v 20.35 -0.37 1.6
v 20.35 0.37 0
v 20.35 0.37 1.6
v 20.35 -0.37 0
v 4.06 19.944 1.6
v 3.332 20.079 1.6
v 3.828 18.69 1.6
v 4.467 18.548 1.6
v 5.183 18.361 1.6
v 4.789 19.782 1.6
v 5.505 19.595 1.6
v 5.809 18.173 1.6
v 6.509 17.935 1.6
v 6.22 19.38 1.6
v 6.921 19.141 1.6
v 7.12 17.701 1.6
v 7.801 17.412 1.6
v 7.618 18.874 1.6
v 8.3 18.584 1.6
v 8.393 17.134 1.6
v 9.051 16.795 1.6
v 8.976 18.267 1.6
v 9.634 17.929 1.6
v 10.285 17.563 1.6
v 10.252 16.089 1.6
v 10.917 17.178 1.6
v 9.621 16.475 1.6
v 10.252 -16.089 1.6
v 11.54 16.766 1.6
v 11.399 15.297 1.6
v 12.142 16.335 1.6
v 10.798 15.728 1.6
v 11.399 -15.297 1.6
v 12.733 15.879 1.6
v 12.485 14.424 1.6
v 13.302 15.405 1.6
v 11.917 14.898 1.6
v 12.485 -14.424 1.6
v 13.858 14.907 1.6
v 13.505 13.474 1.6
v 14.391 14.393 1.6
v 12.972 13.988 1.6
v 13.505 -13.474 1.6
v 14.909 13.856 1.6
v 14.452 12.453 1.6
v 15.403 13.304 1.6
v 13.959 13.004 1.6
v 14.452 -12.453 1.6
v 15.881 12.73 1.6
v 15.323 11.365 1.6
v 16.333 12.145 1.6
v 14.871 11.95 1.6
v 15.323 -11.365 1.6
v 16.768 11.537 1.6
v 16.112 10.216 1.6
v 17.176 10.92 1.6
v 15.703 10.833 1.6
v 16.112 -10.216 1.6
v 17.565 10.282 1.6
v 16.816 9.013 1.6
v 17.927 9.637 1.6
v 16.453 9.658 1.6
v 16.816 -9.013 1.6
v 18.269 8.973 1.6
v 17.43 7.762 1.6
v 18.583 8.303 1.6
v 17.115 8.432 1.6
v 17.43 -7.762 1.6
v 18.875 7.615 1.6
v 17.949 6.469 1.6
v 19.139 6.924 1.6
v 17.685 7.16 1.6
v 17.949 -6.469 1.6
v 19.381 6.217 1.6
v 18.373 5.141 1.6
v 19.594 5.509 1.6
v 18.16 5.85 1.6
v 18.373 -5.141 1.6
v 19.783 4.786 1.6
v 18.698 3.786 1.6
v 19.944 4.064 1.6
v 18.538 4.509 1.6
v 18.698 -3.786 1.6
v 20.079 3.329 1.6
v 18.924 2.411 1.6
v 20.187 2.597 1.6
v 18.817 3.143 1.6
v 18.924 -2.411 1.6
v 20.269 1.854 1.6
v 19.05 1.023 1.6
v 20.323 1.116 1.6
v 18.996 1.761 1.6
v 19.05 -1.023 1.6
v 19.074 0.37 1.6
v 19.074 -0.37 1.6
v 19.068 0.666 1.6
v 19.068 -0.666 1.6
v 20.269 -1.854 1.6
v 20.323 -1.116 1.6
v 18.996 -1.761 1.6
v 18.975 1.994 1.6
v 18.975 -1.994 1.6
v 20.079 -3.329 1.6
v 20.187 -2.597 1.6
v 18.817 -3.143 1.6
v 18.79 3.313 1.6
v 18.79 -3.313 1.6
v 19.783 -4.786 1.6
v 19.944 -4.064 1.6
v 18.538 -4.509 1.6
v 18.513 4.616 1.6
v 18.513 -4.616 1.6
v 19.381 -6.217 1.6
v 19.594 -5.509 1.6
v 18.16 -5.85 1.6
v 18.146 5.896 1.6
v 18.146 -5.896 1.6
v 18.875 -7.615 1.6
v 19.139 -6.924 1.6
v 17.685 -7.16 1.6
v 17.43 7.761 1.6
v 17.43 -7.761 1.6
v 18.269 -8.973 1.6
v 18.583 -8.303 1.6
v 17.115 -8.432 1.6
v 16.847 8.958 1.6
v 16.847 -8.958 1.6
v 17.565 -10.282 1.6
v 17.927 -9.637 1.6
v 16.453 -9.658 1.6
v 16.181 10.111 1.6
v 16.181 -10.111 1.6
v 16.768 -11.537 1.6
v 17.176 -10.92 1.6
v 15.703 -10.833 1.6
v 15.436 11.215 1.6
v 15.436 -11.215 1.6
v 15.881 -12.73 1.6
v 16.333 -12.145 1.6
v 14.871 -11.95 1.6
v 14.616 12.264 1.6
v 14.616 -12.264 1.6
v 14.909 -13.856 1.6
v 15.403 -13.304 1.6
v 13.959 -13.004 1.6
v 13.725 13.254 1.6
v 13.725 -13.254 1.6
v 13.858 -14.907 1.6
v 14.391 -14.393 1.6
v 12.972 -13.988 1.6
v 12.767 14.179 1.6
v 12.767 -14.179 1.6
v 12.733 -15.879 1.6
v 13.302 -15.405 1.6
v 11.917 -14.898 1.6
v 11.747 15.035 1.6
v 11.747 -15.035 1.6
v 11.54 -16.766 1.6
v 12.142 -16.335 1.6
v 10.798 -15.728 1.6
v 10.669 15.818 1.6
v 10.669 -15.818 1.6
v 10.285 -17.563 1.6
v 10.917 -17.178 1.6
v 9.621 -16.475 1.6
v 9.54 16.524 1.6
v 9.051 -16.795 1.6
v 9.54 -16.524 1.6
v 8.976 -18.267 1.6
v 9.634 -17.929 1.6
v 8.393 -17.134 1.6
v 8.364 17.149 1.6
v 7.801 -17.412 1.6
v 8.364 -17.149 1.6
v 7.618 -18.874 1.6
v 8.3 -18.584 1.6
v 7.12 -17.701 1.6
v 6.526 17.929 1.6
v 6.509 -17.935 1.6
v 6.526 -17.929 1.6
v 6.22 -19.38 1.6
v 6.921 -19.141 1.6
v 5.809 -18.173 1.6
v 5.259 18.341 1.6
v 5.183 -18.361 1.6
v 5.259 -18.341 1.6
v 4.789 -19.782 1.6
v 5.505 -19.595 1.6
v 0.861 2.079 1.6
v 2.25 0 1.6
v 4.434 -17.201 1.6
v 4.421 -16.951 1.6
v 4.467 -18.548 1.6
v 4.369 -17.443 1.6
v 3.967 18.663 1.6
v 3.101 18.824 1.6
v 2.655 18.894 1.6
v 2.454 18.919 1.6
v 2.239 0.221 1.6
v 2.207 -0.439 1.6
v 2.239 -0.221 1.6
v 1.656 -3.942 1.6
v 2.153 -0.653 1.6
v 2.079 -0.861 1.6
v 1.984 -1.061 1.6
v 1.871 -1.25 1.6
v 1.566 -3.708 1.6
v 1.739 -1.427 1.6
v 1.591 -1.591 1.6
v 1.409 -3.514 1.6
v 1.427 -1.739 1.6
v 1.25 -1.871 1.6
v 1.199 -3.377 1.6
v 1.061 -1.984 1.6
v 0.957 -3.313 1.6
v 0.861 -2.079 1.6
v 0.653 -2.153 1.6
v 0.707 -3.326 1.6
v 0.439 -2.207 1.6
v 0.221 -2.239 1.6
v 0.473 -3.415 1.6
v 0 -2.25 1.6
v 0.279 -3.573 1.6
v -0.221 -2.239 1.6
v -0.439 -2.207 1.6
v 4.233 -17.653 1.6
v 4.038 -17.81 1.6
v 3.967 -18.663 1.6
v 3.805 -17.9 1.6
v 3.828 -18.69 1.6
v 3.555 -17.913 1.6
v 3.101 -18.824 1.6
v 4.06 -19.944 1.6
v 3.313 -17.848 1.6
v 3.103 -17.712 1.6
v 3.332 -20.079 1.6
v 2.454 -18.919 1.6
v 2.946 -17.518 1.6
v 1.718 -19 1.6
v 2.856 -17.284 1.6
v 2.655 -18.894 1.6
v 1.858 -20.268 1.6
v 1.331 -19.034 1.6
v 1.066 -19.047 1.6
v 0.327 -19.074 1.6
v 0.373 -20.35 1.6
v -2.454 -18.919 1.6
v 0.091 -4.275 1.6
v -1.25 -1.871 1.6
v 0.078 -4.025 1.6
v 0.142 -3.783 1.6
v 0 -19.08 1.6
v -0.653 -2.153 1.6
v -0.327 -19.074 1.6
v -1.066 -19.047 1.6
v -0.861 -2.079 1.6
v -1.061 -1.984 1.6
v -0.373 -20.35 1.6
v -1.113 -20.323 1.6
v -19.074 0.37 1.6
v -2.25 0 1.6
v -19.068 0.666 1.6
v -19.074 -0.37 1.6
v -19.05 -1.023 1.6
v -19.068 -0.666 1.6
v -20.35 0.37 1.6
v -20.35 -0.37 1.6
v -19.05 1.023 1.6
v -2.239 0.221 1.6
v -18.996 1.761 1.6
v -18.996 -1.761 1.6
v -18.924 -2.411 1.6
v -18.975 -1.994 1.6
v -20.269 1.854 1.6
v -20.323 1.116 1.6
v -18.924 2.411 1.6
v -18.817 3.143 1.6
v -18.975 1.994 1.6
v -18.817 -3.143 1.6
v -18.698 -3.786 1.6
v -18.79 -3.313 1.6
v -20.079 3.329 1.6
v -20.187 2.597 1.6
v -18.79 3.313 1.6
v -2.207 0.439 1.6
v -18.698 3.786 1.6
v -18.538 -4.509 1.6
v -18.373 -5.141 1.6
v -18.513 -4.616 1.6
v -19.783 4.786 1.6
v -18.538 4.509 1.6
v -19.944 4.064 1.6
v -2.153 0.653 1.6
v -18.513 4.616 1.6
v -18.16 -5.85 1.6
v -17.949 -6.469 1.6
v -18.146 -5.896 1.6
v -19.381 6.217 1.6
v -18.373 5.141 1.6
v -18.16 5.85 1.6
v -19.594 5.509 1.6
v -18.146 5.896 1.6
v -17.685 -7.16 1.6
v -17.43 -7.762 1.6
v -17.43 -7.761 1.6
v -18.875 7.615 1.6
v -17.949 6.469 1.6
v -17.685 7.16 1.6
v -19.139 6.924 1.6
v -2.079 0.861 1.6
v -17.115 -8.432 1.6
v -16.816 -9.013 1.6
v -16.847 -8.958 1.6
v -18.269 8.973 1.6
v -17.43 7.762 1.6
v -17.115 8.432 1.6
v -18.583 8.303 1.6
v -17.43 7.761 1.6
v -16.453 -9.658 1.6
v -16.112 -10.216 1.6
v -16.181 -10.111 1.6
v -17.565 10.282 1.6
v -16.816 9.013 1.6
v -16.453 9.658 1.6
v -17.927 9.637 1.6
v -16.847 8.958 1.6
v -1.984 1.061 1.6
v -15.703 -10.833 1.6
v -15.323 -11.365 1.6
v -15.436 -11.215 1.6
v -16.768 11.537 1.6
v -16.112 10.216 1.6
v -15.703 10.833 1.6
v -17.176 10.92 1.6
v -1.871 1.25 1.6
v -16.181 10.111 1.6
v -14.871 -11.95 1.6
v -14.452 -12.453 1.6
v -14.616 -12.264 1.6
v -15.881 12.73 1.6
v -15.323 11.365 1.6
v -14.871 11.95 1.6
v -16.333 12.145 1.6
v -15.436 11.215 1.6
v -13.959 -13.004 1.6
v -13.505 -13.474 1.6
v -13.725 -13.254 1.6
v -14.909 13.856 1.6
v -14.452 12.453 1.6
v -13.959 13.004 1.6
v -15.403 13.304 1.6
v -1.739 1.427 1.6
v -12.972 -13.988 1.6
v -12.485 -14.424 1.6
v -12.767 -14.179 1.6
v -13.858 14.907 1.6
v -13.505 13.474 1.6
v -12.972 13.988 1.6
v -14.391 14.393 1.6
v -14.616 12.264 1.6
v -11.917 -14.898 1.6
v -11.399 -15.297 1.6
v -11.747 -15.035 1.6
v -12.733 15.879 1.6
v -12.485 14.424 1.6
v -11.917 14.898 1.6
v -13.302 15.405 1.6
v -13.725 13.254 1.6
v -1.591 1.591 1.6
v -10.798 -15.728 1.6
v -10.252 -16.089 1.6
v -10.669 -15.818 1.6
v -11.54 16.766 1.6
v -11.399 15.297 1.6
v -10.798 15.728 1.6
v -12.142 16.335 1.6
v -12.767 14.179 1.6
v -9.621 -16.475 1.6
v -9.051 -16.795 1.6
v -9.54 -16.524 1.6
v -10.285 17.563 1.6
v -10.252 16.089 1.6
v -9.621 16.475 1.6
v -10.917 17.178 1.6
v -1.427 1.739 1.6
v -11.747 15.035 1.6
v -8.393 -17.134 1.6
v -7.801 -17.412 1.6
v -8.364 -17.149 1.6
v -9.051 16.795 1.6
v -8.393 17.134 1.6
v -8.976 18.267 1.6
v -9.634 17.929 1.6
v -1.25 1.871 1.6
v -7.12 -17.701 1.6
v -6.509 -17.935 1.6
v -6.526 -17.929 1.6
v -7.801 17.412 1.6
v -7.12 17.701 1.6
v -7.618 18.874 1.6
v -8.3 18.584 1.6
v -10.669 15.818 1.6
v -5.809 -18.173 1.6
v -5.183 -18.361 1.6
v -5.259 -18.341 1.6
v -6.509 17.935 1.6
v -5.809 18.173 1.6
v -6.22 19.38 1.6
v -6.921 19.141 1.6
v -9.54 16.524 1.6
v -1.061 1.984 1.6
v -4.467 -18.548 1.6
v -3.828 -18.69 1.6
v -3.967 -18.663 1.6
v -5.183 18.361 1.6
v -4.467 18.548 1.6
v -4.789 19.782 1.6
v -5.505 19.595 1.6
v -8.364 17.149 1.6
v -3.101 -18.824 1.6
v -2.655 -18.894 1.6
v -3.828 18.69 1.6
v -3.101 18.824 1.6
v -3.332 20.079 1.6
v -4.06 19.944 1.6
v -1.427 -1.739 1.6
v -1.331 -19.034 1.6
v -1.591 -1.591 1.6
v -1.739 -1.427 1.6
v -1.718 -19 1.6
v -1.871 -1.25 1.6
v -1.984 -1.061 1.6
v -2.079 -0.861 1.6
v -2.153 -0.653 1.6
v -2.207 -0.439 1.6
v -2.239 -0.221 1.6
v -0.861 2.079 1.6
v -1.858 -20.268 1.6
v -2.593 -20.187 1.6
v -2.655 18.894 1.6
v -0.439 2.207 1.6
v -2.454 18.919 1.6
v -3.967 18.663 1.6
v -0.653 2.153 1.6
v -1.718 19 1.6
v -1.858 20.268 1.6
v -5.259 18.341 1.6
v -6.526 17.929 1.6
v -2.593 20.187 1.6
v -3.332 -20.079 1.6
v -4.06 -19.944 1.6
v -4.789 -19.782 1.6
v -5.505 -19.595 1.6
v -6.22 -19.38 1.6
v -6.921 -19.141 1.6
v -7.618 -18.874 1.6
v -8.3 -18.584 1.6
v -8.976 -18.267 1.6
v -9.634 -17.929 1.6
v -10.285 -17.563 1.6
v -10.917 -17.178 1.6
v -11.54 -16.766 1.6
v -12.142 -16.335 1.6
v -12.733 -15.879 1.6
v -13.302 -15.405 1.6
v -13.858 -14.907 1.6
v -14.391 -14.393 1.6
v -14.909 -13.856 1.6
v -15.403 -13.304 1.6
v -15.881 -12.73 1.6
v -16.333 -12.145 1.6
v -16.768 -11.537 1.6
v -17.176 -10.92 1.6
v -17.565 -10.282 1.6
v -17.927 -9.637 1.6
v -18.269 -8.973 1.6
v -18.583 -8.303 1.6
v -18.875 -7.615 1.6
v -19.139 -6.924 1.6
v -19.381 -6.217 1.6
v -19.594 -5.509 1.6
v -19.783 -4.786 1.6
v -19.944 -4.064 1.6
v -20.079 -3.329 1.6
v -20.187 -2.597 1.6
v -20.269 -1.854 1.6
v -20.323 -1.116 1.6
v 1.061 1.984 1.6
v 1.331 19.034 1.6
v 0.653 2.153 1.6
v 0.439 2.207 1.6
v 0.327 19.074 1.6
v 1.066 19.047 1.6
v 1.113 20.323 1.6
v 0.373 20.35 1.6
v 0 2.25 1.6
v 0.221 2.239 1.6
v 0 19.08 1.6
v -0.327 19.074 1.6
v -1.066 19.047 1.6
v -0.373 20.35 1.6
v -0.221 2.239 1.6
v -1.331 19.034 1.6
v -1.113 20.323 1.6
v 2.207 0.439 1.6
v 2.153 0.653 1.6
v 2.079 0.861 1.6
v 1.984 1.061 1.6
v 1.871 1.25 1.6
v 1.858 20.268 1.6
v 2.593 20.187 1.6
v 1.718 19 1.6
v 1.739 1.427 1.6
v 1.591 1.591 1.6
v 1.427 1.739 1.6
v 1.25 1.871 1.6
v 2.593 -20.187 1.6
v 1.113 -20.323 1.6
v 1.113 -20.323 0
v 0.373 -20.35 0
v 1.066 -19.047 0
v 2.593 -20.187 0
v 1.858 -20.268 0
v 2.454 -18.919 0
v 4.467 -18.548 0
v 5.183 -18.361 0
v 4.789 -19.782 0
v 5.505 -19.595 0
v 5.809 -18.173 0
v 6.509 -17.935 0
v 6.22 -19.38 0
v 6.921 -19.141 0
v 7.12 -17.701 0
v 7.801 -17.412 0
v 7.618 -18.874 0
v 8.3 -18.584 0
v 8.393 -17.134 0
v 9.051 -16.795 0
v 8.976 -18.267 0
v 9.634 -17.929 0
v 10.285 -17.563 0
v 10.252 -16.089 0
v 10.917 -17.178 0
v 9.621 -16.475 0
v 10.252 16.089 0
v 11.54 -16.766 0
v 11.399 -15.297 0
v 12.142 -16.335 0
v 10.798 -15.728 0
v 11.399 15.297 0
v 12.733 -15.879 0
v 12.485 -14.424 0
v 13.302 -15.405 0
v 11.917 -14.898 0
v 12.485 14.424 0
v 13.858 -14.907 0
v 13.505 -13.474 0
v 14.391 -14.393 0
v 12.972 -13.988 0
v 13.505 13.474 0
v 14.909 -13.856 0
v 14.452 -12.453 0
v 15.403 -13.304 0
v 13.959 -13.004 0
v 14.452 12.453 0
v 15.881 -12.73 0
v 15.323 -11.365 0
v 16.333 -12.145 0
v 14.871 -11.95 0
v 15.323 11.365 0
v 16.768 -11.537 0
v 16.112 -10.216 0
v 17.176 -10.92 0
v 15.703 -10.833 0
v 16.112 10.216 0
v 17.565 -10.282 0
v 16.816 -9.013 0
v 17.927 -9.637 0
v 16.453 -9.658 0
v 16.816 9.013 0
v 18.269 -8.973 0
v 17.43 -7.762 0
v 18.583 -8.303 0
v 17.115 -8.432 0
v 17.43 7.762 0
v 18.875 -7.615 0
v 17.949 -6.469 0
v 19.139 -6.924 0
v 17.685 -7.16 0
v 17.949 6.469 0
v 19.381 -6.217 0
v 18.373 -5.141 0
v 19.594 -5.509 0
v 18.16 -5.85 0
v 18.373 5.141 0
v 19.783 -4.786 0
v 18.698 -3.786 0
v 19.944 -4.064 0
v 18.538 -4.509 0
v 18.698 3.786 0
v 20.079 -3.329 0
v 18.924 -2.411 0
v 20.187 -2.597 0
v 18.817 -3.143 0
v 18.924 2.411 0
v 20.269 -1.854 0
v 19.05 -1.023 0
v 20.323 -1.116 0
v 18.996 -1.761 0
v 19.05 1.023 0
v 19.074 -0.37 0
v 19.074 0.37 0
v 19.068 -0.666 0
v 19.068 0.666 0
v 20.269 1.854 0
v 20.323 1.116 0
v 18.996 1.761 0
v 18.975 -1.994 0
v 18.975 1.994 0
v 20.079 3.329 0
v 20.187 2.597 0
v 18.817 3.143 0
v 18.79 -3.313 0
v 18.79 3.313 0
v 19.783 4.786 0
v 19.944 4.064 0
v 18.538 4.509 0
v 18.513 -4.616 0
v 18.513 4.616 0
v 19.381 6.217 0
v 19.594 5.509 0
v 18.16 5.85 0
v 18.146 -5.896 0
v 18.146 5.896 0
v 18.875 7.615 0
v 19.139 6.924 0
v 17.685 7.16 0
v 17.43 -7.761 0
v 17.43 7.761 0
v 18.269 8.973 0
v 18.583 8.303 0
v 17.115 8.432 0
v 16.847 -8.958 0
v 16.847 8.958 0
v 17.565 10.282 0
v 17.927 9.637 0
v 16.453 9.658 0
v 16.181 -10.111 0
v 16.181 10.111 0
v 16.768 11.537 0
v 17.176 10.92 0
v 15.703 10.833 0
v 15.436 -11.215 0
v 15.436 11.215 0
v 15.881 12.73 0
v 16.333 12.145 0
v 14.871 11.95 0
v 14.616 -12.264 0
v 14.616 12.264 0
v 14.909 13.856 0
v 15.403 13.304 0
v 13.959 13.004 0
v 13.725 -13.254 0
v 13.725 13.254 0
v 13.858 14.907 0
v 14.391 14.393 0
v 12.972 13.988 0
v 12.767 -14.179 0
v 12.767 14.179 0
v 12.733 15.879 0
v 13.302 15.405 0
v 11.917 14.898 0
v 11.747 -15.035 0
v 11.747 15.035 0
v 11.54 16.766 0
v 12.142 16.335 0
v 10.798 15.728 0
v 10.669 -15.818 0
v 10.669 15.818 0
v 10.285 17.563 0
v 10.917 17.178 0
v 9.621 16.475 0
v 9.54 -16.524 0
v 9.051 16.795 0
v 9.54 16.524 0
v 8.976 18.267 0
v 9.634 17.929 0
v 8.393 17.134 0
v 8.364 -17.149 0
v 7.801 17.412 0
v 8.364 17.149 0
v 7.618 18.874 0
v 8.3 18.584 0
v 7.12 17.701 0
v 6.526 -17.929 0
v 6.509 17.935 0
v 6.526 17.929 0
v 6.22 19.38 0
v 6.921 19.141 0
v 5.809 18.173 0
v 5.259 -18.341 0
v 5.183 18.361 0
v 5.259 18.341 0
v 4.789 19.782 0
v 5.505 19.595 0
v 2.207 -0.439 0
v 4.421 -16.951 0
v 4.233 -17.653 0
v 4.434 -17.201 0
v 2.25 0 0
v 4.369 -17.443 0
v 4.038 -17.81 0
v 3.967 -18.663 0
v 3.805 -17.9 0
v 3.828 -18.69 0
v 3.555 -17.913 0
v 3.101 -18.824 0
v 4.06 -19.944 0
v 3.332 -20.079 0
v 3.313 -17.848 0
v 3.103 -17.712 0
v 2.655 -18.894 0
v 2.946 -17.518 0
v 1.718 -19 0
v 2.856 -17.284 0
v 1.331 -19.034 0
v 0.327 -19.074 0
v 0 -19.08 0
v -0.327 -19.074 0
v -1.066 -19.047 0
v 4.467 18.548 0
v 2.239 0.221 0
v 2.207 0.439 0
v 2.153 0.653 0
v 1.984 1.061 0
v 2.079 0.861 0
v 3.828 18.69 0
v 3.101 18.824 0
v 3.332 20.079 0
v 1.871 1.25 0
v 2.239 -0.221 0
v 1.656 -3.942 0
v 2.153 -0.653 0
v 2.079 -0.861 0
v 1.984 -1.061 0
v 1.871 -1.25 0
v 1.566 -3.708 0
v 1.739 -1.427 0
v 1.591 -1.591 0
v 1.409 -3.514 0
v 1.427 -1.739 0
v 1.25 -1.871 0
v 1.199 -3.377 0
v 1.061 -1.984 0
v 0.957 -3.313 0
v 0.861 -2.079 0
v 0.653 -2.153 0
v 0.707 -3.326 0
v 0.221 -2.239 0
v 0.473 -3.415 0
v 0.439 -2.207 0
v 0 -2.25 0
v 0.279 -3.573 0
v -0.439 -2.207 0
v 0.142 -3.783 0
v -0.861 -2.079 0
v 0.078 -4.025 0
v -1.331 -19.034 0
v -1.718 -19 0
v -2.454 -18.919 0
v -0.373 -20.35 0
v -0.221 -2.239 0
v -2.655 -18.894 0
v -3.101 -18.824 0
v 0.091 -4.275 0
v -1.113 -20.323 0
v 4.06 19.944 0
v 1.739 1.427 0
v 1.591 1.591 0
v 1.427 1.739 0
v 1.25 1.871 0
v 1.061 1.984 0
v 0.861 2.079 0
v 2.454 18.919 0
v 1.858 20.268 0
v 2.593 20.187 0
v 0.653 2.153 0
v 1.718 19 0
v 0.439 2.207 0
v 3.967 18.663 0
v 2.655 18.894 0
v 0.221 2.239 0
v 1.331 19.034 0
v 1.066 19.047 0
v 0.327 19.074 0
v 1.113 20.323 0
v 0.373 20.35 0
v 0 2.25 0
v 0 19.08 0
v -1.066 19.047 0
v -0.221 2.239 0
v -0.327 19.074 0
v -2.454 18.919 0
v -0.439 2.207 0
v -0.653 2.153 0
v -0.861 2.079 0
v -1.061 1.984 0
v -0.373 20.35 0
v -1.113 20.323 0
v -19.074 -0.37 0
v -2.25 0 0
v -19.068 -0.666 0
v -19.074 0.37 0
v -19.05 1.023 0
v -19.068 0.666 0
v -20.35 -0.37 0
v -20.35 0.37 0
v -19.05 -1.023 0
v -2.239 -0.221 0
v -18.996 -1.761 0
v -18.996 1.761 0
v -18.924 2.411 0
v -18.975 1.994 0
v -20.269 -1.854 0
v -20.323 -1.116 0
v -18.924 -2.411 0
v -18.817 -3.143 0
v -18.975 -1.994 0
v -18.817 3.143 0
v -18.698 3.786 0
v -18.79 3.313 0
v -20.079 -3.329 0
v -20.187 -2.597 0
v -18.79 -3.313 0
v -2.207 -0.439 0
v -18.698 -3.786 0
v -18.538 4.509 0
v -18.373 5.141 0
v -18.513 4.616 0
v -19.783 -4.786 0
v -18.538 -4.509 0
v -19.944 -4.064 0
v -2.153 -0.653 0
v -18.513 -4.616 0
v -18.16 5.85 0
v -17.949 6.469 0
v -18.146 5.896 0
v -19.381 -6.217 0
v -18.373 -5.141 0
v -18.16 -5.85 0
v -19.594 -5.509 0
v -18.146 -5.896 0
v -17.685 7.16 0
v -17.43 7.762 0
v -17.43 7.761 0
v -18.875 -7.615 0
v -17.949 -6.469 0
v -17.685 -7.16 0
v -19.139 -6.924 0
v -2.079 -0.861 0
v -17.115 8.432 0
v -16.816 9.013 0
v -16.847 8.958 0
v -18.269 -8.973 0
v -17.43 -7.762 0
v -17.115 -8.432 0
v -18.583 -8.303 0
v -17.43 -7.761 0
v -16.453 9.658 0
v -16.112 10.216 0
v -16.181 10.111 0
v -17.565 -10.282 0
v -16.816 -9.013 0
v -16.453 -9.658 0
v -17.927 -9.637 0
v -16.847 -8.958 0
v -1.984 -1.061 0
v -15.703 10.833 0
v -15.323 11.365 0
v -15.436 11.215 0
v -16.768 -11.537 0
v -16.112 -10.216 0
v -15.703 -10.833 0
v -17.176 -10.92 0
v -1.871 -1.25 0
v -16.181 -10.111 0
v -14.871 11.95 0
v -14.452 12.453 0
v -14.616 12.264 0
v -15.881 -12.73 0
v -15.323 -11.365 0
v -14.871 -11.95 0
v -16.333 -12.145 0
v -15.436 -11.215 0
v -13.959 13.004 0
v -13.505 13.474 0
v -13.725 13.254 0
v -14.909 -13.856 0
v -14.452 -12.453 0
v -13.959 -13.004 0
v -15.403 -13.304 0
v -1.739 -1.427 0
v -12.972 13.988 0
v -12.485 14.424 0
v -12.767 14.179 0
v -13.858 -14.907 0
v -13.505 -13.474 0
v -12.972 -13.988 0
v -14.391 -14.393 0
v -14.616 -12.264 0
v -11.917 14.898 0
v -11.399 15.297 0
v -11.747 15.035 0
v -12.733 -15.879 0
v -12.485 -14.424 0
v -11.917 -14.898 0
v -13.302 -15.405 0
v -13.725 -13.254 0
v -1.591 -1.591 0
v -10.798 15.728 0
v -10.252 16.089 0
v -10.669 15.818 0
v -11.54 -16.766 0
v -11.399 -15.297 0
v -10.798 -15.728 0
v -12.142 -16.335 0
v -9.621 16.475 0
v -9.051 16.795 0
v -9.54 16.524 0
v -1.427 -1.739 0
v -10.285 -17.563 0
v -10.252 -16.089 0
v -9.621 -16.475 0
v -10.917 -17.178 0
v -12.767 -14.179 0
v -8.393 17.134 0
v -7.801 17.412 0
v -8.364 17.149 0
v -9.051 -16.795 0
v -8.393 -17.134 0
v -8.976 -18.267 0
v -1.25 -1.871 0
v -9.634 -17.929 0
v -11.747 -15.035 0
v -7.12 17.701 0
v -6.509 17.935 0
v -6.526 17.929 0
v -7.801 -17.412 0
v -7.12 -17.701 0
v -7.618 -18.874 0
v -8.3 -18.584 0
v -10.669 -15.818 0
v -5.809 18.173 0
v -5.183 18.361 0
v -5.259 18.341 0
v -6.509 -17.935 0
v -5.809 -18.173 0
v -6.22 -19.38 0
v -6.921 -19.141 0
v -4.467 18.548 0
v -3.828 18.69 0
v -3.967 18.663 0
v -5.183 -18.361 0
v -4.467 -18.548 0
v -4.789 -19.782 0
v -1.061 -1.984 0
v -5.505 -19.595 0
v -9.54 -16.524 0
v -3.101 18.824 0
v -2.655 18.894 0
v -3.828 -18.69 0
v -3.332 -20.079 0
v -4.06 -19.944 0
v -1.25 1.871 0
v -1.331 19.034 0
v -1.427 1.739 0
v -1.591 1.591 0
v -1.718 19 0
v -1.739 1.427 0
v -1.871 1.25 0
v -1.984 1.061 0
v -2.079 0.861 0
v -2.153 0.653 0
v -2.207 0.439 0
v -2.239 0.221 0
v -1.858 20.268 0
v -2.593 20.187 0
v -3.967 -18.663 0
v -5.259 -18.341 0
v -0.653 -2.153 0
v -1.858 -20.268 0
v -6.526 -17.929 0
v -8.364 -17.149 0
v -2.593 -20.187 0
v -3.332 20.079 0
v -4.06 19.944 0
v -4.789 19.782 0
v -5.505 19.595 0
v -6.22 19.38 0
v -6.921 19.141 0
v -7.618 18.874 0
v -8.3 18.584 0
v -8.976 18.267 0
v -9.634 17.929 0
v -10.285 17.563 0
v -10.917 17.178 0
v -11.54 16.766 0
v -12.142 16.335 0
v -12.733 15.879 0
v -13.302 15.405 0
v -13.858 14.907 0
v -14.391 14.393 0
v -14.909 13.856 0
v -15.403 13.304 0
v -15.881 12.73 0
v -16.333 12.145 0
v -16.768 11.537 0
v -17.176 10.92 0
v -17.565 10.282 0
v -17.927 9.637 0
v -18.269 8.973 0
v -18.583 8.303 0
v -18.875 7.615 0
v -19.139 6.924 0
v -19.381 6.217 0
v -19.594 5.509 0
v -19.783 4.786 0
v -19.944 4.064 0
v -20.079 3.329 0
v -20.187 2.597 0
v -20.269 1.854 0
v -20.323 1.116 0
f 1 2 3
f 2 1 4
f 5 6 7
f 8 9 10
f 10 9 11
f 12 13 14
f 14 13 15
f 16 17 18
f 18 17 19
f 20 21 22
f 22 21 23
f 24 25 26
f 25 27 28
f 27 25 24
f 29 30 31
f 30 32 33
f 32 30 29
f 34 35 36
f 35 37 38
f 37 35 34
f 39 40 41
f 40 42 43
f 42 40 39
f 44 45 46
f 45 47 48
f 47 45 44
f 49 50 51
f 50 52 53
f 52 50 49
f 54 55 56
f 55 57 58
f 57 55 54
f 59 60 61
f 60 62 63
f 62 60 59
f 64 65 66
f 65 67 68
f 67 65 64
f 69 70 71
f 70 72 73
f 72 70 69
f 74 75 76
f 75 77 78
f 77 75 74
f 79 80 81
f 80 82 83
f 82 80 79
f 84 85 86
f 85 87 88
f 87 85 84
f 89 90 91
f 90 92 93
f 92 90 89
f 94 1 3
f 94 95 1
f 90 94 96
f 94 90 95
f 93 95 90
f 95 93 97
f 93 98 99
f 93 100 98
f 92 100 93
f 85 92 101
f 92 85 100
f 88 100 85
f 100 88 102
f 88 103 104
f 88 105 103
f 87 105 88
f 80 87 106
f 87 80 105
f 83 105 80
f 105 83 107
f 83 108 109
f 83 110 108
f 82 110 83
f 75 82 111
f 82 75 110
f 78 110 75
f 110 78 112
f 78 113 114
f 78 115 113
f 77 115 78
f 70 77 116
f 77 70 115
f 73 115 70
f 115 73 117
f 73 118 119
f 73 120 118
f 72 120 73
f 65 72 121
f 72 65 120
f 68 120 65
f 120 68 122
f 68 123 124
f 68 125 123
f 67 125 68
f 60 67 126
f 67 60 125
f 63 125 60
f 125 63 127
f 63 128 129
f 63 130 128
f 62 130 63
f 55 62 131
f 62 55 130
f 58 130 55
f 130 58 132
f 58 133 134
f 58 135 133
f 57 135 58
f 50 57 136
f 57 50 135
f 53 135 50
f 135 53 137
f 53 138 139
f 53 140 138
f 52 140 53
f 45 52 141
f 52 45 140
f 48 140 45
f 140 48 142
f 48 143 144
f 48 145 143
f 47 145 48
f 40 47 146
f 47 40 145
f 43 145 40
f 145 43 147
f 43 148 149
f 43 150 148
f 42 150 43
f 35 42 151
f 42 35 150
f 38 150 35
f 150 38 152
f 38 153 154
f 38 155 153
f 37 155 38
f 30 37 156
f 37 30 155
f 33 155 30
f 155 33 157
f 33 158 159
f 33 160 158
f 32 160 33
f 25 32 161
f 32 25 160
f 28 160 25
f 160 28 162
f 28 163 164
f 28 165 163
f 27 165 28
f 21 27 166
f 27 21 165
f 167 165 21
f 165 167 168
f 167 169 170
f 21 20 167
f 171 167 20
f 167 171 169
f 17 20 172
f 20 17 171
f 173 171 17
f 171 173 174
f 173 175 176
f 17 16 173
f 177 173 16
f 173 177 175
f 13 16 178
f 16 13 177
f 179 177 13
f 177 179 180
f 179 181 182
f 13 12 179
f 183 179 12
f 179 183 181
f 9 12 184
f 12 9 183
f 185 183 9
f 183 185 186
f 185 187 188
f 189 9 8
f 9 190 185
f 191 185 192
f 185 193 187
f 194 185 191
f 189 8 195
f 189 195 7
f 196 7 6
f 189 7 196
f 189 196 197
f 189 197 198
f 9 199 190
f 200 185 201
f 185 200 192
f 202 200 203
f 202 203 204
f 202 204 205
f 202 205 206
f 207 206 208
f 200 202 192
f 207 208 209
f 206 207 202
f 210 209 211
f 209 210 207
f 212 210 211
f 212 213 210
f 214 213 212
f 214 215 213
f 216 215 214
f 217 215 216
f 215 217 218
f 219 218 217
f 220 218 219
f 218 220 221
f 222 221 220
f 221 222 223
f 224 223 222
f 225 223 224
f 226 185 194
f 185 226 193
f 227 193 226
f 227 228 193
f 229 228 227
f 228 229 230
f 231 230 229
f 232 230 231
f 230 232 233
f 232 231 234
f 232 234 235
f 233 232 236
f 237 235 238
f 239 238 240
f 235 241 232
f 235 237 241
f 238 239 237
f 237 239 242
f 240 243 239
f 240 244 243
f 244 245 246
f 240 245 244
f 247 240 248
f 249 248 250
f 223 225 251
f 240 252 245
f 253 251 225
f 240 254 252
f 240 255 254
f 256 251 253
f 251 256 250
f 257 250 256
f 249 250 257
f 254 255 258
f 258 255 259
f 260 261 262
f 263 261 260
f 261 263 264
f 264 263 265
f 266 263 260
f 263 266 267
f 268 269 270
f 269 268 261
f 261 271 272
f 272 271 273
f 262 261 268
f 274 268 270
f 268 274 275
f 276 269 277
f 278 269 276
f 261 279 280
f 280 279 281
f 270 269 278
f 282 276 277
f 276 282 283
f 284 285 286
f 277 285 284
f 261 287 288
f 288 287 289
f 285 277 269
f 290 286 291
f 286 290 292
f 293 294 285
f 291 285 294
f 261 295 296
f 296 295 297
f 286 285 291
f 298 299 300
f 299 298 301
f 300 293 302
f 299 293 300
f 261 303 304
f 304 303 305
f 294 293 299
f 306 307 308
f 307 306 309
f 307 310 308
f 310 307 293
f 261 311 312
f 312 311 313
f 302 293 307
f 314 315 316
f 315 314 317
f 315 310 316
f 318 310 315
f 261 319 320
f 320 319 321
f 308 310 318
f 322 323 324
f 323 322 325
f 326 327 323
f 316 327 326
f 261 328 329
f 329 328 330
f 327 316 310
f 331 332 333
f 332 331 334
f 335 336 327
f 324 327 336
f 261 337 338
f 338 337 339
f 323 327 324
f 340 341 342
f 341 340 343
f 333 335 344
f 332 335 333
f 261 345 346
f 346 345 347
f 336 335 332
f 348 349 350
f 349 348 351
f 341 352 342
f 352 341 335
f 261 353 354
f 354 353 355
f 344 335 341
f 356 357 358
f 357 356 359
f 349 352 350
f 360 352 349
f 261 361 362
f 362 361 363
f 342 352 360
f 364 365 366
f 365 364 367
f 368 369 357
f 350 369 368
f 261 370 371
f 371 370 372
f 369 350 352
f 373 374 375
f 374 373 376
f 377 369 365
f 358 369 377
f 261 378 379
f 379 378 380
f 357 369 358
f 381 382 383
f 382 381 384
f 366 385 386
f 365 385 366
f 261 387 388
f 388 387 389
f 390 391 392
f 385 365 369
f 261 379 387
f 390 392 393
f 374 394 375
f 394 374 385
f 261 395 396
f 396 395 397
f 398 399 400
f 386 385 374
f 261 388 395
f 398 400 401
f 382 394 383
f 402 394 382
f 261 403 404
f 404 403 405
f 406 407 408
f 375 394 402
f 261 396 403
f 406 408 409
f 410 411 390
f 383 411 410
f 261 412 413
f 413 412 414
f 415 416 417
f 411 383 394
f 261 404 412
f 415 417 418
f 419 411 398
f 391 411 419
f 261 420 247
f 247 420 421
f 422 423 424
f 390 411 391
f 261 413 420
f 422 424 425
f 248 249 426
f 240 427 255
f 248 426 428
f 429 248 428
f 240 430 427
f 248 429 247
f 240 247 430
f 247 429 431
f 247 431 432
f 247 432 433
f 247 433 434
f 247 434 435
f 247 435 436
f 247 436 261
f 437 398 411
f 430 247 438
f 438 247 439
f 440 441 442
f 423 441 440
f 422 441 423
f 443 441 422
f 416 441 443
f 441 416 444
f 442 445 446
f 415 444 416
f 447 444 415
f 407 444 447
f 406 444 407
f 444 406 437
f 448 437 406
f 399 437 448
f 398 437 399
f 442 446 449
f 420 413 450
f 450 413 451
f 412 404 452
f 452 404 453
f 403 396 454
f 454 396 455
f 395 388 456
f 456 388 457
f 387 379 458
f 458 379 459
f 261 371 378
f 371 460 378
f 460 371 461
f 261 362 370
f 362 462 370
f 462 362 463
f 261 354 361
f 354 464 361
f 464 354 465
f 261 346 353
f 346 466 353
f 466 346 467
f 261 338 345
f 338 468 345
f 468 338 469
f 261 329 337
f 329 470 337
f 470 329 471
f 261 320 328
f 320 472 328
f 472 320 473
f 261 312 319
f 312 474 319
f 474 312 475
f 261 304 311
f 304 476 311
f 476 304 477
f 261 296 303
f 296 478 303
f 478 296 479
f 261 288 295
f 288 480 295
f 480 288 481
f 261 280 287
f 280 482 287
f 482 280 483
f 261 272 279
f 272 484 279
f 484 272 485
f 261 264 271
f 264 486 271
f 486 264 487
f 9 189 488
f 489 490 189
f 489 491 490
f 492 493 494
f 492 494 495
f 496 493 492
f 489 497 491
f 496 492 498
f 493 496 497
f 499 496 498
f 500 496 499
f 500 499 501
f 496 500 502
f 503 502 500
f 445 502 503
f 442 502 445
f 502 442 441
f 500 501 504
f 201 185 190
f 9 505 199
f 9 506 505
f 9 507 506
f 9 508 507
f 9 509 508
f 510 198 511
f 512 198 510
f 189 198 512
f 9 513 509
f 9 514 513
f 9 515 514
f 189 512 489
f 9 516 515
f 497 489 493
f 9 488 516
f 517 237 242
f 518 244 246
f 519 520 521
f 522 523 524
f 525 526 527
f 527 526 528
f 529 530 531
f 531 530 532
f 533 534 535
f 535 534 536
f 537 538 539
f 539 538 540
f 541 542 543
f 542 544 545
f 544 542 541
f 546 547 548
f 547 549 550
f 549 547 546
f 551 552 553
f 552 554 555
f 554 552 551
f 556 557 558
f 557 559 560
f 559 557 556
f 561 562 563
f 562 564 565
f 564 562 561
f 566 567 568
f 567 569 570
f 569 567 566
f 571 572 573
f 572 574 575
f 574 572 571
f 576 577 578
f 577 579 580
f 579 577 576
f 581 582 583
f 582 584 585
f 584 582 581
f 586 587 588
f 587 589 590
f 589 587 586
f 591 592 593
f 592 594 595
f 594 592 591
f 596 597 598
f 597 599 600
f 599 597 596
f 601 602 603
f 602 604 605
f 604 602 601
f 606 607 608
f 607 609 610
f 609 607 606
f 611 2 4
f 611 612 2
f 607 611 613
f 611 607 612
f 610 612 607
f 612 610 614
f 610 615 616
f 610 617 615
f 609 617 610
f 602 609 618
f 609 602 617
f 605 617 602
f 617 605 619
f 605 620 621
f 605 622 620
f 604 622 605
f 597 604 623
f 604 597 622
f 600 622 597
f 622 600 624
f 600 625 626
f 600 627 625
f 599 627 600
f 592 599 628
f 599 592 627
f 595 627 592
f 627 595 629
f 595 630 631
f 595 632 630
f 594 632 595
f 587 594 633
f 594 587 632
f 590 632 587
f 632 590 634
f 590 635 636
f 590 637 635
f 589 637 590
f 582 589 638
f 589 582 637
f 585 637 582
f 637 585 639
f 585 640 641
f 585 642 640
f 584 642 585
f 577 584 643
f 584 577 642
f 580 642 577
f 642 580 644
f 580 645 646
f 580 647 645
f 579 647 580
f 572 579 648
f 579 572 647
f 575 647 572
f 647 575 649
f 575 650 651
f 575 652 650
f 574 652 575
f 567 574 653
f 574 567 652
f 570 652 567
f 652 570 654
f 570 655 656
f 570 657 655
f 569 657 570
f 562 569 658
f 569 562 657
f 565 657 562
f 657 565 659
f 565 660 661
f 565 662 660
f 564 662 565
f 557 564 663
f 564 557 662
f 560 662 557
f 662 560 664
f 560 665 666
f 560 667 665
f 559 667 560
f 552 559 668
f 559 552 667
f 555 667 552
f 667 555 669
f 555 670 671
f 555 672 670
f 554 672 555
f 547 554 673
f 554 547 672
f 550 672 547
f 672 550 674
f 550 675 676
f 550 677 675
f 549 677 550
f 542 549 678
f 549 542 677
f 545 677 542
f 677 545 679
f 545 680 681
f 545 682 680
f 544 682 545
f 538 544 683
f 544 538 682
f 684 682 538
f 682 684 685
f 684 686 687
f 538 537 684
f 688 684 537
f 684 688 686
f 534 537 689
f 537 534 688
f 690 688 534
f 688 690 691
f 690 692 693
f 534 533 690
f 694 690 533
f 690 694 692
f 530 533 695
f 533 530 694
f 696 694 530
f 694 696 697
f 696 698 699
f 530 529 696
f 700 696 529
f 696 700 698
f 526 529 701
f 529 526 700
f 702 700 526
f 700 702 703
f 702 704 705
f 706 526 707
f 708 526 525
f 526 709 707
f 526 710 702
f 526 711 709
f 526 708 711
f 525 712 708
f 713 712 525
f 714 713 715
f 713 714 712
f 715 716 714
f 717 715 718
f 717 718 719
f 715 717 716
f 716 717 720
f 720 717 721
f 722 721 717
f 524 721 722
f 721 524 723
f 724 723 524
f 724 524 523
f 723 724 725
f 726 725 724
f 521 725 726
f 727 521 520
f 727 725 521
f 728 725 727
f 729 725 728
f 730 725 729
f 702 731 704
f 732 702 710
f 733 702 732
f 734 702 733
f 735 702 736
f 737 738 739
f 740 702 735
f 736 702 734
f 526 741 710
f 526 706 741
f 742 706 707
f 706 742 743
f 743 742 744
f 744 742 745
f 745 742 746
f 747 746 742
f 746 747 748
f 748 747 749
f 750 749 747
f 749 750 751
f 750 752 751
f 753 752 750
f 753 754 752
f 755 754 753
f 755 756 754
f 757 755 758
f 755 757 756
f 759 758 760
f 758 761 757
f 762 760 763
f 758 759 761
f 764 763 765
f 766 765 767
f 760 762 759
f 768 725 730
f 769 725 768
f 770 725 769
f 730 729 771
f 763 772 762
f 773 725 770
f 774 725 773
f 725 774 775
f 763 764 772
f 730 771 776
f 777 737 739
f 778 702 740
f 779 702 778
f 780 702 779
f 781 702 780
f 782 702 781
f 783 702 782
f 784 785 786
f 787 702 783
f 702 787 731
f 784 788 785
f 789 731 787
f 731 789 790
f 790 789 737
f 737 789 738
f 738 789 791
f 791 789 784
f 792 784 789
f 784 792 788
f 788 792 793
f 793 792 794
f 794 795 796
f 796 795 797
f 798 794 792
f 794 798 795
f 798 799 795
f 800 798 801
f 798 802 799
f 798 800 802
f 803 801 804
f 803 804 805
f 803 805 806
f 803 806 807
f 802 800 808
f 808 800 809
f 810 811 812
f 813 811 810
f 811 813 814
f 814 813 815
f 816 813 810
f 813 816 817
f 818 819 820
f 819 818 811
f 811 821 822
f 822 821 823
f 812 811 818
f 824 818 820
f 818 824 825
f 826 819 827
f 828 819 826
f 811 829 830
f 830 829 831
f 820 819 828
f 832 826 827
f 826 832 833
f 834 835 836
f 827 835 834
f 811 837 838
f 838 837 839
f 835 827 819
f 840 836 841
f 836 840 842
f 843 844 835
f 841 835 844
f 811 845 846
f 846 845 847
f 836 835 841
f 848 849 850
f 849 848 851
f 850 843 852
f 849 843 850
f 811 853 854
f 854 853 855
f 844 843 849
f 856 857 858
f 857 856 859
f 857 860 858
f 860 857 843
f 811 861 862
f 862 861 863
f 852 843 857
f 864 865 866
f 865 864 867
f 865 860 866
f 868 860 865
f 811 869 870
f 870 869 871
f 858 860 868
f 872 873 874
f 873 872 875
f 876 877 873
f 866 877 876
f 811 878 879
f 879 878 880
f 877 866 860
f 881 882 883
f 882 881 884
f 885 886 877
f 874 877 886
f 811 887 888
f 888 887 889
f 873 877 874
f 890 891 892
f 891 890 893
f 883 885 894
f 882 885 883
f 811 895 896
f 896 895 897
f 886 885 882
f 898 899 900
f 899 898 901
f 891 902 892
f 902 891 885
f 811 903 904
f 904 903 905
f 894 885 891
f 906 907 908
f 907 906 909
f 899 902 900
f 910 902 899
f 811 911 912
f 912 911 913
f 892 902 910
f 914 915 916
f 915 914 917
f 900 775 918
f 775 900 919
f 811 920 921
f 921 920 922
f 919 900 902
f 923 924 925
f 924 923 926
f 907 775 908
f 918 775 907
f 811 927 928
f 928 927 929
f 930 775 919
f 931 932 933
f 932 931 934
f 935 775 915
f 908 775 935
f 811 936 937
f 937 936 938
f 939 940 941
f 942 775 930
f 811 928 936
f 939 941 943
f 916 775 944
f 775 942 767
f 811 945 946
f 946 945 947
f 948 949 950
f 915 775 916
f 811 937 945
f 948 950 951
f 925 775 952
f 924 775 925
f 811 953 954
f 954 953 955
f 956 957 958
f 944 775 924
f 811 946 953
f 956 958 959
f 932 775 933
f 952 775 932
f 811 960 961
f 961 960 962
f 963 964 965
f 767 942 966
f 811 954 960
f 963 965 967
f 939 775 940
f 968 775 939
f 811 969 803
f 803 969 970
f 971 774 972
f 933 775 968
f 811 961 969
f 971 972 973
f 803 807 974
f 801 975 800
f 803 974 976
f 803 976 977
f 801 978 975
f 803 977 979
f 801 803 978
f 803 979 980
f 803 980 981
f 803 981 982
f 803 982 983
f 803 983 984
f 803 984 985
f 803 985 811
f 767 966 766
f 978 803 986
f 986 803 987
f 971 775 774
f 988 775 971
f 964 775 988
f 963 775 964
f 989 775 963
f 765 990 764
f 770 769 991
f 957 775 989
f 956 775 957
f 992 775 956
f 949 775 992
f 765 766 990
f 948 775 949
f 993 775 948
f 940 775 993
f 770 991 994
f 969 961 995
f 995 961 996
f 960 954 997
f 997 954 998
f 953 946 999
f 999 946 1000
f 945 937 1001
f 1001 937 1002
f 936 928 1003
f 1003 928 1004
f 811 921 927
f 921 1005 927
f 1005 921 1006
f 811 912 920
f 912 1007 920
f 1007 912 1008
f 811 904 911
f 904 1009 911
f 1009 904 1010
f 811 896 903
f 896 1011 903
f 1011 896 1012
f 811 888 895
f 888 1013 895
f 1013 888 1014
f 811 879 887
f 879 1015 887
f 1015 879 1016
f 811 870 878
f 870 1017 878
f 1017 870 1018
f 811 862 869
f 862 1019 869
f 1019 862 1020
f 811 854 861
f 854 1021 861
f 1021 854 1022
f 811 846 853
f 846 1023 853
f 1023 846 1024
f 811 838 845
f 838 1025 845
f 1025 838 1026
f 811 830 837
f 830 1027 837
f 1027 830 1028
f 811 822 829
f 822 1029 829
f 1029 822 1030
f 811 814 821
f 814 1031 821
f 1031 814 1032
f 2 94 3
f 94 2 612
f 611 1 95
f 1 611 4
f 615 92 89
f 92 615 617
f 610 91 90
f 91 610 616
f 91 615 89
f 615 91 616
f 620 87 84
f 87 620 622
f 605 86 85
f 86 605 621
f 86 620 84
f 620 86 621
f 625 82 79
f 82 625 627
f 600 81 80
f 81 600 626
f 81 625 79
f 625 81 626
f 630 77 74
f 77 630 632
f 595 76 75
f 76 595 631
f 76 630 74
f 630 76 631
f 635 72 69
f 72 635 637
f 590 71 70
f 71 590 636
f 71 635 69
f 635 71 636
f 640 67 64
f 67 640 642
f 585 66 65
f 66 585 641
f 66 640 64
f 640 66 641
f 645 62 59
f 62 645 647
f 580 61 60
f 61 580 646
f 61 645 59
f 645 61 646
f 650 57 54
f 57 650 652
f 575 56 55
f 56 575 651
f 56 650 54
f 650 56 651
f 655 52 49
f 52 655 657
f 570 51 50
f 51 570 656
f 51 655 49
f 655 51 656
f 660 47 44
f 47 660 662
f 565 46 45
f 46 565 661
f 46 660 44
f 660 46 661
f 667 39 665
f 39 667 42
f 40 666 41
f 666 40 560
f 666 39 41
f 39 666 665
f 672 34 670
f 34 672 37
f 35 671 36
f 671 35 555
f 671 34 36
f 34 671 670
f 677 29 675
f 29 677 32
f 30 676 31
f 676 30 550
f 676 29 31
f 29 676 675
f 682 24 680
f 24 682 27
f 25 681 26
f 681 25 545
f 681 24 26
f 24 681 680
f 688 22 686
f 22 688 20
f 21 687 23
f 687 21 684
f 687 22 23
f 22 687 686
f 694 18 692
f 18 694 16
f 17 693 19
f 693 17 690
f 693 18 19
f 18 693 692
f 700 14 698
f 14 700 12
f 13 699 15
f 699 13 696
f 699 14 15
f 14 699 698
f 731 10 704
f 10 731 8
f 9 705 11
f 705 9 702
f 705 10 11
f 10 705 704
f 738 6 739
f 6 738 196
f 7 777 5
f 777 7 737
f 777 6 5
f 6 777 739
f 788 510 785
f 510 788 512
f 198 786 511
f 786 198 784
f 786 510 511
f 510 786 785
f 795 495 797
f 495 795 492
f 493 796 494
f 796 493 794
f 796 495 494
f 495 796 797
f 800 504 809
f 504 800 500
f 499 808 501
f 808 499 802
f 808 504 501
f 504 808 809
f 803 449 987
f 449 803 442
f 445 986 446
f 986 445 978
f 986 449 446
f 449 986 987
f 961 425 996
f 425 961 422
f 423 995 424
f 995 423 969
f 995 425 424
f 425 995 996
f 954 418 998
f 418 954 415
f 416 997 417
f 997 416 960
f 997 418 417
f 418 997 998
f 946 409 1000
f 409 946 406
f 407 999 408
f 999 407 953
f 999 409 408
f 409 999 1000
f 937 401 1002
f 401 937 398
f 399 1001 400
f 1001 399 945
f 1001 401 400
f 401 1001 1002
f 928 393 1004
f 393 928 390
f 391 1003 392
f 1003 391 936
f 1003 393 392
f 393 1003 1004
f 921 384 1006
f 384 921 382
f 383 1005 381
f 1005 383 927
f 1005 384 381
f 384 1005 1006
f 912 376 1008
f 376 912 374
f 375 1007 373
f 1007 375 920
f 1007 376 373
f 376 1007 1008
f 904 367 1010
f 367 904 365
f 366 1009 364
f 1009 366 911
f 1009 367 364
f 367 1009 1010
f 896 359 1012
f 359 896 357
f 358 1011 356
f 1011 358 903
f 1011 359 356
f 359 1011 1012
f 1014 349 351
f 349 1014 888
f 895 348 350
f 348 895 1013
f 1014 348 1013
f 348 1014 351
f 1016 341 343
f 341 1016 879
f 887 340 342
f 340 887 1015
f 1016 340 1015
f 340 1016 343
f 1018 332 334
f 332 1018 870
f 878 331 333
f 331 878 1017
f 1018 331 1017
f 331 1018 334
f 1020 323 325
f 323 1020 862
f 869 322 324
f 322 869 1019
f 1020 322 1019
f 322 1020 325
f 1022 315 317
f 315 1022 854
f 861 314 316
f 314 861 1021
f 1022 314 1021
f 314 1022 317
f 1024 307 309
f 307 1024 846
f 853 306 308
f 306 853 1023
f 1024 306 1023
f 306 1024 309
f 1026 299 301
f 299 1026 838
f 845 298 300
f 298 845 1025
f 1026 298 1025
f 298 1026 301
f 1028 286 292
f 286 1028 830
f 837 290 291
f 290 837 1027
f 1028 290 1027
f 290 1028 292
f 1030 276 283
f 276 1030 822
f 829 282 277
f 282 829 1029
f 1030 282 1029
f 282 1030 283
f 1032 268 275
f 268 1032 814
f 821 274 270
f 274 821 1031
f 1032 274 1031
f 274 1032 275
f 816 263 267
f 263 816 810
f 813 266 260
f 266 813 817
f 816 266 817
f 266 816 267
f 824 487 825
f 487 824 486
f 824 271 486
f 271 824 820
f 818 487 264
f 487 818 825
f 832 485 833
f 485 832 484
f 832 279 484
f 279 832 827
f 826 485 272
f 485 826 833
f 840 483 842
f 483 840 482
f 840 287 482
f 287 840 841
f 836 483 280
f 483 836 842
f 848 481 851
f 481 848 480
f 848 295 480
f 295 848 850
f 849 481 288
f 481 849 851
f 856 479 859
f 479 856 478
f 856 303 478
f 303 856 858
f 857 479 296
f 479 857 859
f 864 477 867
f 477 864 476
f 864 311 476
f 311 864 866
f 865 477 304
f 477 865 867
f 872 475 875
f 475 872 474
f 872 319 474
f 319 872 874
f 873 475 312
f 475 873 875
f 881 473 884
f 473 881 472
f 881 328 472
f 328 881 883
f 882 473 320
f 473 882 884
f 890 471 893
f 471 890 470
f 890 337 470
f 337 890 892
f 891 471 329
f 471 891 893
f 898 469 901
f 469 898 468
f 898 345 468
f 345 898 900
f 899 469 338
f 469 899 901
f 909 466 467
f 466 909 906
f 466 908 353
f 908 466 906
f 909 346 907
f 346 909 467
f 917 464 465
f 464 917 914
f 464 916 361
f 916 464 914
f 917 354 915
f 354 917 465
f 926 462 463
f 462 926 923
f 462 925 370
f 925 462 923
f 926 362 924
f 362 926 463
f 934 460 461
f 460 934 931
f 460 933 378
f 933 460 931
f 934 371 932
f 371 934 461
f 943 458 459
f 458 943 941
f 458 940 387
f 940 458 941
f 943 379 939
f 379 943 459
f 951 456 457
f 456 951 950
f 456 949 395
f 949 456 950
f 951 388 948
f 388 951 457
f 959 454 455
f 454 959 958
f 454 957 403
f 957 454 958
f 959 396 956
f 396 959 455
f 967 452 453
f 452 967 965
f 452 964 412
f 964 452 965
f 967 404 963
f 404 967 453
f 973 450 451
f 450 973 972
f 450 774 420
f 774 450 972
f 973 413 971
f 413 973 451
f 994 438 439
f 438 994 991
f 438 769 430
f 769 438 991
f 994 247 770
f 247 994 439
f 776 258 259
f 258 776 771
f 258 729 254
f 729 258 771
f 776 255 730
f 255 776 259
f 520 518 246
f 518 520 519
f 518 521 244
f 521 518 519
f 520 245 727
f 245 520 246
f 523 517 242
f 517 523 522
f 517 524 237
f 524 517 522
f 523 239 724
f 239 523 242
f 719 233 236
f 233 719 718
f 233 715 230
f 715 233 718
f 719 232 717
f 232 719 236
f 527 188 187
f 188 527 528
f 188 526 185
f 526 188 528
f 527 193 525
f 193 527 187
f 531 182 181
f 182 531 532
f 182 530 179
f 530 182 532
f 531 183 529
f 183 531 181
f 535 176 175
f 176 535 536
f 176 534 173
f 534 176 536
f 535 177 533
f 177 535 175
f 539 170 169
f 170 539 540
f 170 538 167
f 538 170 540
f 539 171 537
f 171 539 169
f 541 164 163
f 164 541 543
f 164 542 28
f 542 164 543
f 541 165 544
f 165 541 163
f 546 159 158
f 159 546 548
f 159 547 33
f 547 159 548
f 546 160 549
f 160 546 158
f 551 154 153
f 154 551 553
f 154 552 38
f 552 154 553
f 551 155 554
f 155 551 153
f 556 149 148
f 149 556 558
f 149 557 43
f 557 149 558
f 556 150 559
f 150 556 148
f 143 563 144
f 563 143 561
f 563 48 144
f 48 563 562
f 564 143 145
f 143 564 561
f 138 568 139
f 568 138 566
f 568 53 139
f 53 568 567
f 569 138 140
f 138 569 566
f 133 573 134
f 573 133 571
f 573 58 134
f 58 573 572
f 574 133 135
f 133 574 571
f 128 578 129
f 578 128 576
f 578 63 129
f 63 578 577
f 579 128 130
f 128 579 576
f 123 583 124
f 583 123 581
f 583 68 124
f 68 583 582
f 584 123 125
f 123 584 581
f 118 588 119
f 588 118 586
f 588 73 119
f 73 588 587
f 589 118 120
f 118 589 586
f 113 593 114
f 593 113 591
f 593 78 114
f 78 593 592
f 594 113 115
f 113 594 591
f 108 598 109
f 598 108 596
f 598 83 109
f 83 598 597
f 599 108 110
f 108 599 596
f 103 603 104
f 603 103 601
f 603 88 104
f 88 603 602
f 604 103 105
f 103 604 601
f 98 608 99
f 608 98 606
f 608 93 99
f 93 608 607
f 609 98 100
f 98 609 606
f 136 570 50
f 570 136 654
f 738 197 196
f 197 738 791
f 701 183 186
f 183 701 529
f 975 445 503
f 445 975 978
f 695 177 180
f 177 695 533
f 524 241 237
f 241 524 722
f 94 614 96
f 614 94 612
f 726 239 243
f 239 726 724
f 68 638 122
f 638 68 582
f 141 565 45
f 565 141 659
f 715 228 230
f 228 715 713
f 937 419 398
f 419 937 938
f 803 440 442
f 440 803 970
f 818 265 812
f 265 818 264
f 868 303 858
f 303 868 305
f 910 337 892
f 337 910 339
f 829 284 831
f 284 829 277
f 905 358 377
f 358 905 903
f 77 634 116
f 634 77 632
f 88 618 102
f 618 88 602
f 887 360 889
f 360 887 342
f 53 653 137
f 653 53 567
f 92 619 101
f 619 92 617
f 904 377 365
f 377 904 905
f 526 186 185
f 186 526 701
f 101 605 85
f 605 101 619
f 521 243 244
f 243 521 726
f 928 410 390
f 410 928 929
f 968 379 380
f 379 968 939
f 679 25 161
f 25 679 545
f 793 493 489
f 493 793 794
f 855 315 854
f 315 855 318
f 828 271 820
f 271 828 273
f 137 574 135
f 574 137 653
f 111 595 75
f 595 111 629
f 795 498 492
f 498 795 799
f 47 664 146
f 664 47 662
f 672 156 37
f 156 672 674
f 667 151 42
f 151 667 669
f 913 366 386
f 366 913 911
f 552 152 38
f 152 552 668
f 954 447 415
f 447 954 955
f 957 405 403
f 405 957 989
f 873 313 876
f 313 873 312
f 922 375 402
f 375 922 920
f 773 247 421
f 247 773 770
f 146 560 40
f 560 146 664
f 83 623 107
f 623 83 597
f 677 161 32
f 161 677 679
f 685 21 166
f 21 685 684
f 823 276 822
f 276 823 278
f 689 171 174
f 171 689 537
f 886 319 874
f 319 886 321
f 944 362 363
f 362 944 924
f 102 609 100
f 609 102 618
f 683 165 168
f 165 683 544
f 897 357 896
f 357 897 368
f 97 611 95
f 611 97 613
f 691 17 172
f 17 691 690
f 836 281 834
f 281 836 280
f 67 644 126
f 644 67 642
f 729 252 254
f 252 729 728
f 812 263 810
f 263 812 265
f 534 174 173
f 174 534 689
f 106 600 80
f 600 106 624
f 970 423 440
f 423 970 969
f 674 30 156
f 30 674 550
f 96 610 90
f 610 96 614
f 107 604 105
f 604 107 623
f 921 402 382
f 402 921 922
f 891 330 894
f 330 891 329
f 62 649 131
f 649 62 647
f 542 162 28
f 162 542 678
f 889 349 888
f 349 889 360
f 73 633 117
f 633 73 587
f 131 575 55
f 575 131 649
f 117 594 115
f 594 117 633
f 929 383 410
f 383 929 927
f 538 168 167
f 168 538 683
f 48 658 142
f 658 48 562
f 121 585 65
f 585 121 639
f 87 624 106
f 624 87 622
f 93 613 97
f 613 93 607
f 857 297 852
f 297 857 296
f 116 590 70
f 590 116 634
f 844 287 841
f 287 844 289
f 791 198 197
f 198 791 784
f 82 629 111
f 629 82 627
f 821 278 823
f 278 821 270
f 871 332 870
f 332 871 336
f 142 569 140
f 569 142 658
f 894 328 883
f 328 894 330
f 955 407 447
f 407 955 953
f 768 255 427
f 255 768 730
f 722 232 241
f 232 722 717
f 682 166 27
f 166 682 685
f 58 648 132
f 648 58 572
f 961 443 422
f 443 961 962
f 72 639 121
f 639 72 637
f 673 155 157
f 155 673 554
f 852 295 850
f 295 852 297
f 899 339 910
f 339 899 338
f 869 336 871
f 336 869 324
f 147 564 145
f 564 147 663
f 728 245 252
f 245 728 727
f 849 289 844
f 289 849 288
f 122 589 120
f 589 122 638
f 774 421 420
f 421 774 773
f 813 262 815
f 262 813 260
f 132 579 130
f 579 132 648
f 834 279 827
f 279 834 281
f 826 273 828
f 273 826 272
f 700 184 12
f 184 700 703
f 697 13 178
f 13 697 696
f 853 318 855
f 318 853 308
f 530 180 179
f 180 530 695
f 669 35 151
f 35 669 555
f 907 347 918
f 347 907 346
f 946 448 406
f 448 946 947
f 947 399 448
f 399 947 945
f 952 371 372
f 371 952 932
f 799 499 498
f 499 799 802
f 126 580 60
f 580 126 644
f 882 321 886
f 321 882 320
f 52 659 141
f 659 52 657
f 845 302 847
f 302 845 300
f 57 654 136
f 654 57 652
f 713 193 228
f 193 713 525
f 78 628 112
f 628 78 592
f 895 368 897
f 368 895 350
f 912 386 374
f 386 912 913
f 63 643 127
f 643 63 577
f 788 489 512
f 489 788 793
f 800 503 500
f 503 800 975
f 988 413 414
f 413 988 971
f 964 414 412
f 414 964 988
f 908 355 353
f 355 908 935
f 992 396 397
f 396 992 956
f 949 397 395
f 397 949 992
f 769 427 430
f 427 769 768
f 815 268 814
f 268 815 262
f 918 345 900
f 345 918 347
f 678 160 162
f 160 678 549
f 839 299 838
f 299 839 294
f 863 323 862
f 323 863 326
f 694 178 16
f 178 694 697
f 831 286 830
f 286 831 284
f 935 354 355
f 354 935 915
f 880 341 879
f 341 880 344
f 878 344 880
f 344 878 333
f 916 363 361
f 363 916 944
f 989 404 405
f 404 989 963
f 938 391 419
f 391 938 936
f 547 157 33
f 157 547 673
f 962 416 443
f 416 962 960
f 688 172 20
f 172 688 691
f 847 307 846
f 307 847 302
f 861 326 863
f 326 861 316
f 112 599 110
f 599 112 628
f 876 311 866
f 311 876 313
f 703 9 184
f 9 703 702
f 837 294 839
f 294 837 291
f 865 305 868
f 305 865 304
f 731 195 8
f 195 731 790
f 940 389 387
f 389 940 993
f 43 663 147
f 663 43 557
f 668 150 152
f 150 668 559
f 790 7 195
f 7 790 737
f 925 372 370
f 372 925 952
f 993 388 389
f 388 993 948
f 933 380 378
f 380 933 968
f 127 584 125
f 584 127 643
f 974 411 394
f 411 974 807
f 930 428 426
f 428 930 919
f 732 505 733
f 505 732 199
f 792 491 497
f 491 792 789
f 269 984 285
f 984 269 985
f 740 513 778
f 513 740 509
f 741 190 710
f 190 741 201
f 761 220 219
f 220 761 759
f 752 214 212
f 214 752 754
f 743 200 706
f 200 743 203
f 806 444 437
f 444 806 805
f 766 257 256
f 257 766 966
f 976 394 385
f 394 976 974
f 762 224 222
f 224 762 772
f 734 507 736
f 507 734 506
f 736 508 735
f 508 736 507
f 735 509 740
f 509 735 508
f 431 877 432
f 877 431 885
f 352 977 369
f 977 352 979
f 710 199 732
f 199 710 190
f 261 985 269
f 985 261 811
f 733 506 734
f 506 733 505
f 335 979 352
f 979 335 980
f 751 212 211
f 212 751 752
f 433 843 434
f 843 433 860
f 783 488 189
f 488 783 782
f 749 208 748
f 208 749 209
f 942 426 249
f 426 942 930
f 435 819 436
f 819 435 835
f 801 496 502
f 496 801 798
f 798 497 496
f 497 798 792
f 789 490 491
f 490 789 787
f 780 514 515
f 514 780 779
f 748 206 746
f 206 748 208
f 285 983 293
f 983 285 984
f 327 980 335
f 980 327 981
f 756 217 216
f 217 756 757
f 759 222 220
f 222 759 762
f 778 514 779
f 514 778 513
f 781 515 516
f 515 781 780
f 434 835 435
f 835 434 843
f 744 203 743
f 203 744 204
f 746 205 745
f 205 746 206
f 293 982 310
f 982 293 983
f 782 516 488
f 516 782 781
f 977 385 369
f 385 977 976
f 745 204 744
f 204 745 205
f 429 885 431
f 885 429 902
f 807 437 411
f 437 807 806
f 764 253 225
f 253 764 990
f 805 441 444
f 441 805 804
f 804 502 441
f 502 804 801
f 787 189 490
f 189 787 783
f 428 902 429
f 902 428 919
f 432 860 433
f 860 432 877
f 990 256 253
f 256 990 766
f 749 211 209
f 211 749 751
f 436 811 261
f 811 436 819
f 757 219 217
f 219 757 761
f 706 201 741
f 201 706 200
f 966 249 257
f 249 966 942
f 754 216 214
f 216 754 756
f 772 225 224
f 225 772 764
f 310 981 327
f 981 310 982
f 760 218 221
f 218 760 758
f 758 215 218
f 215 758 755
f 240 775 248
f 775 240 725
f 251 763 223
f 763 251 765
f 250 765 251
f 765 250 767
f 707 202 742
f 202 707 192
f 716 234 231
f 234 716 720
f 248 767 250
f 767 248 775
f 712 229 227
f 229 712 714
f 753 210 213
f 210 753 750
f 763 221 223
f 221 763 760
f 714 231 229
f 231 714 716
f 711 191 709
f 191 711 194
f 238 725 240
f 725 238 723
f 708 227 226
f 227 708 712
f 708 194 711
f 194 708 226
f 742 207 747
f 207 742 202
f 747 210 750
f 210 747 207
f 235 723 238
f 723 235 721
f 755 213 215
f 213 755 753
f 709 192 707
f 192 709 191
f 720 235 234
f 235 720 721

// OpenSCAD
// part_id: mar3
// name: Mars gear
// source_drawing_ids: DRW-013
// units: mm
// revision: 0.1
// SPDX-License-Identifier: MIT

module mar3_tooth_ring(root_d = 38.16, tip_d = 40.66, tooth_count = 86, thickness = 1.6, tooth_w = 0.74) {
    union() {
        cylinder(d = root_d, h = thickness, center = false, $fn = 180);
        for (a = [0 : 360 / tooth_count : 360 - 360 / tooth_count]) {
            rotate([0, 0, a])
                translate([root_d / 2 - 0.02, -tooth_w / 2, 0])
                    cube([(tip_d - root_d) / 2 + 0.04, tooth_w, thickness], center = false);
        }
    }
}

module part_mar3(
    root_d = 38.16,
    tip_d = 40.66,
    tooth_count = 86,
    thickness = 1.6,
    bore_d = 4.5,
    slot_w = 1.6,
    slot_l = 13.3,
    slot_r = 4.2,
    slot_a = -78
) {
    difference() {
        mar3_tooth_ring(root_d = root_d, tip_d = tip_d, tooth_count = tooth_count, thickness = thickness);
        translate([0, 0, -0.05]) cylinder(d = bore_d, h = thickness + 0.1, $fn = 64);
        rotate([0, 0, slot_a])
            translate([slot_r, 0, -0.05])
                hull() {
                    cylinder(d = slot_w, h = thickness + 0.1, $fn = 20);
                    translate([slot_l, 0, 0]) cylinder(d = slot_w, h = thickness + 0.1, $fn = 20);
                }
    }
}

// ---- "main guard" ----
if (is_undef(__LIB_MODE__)) {
    part_mar3();
}
